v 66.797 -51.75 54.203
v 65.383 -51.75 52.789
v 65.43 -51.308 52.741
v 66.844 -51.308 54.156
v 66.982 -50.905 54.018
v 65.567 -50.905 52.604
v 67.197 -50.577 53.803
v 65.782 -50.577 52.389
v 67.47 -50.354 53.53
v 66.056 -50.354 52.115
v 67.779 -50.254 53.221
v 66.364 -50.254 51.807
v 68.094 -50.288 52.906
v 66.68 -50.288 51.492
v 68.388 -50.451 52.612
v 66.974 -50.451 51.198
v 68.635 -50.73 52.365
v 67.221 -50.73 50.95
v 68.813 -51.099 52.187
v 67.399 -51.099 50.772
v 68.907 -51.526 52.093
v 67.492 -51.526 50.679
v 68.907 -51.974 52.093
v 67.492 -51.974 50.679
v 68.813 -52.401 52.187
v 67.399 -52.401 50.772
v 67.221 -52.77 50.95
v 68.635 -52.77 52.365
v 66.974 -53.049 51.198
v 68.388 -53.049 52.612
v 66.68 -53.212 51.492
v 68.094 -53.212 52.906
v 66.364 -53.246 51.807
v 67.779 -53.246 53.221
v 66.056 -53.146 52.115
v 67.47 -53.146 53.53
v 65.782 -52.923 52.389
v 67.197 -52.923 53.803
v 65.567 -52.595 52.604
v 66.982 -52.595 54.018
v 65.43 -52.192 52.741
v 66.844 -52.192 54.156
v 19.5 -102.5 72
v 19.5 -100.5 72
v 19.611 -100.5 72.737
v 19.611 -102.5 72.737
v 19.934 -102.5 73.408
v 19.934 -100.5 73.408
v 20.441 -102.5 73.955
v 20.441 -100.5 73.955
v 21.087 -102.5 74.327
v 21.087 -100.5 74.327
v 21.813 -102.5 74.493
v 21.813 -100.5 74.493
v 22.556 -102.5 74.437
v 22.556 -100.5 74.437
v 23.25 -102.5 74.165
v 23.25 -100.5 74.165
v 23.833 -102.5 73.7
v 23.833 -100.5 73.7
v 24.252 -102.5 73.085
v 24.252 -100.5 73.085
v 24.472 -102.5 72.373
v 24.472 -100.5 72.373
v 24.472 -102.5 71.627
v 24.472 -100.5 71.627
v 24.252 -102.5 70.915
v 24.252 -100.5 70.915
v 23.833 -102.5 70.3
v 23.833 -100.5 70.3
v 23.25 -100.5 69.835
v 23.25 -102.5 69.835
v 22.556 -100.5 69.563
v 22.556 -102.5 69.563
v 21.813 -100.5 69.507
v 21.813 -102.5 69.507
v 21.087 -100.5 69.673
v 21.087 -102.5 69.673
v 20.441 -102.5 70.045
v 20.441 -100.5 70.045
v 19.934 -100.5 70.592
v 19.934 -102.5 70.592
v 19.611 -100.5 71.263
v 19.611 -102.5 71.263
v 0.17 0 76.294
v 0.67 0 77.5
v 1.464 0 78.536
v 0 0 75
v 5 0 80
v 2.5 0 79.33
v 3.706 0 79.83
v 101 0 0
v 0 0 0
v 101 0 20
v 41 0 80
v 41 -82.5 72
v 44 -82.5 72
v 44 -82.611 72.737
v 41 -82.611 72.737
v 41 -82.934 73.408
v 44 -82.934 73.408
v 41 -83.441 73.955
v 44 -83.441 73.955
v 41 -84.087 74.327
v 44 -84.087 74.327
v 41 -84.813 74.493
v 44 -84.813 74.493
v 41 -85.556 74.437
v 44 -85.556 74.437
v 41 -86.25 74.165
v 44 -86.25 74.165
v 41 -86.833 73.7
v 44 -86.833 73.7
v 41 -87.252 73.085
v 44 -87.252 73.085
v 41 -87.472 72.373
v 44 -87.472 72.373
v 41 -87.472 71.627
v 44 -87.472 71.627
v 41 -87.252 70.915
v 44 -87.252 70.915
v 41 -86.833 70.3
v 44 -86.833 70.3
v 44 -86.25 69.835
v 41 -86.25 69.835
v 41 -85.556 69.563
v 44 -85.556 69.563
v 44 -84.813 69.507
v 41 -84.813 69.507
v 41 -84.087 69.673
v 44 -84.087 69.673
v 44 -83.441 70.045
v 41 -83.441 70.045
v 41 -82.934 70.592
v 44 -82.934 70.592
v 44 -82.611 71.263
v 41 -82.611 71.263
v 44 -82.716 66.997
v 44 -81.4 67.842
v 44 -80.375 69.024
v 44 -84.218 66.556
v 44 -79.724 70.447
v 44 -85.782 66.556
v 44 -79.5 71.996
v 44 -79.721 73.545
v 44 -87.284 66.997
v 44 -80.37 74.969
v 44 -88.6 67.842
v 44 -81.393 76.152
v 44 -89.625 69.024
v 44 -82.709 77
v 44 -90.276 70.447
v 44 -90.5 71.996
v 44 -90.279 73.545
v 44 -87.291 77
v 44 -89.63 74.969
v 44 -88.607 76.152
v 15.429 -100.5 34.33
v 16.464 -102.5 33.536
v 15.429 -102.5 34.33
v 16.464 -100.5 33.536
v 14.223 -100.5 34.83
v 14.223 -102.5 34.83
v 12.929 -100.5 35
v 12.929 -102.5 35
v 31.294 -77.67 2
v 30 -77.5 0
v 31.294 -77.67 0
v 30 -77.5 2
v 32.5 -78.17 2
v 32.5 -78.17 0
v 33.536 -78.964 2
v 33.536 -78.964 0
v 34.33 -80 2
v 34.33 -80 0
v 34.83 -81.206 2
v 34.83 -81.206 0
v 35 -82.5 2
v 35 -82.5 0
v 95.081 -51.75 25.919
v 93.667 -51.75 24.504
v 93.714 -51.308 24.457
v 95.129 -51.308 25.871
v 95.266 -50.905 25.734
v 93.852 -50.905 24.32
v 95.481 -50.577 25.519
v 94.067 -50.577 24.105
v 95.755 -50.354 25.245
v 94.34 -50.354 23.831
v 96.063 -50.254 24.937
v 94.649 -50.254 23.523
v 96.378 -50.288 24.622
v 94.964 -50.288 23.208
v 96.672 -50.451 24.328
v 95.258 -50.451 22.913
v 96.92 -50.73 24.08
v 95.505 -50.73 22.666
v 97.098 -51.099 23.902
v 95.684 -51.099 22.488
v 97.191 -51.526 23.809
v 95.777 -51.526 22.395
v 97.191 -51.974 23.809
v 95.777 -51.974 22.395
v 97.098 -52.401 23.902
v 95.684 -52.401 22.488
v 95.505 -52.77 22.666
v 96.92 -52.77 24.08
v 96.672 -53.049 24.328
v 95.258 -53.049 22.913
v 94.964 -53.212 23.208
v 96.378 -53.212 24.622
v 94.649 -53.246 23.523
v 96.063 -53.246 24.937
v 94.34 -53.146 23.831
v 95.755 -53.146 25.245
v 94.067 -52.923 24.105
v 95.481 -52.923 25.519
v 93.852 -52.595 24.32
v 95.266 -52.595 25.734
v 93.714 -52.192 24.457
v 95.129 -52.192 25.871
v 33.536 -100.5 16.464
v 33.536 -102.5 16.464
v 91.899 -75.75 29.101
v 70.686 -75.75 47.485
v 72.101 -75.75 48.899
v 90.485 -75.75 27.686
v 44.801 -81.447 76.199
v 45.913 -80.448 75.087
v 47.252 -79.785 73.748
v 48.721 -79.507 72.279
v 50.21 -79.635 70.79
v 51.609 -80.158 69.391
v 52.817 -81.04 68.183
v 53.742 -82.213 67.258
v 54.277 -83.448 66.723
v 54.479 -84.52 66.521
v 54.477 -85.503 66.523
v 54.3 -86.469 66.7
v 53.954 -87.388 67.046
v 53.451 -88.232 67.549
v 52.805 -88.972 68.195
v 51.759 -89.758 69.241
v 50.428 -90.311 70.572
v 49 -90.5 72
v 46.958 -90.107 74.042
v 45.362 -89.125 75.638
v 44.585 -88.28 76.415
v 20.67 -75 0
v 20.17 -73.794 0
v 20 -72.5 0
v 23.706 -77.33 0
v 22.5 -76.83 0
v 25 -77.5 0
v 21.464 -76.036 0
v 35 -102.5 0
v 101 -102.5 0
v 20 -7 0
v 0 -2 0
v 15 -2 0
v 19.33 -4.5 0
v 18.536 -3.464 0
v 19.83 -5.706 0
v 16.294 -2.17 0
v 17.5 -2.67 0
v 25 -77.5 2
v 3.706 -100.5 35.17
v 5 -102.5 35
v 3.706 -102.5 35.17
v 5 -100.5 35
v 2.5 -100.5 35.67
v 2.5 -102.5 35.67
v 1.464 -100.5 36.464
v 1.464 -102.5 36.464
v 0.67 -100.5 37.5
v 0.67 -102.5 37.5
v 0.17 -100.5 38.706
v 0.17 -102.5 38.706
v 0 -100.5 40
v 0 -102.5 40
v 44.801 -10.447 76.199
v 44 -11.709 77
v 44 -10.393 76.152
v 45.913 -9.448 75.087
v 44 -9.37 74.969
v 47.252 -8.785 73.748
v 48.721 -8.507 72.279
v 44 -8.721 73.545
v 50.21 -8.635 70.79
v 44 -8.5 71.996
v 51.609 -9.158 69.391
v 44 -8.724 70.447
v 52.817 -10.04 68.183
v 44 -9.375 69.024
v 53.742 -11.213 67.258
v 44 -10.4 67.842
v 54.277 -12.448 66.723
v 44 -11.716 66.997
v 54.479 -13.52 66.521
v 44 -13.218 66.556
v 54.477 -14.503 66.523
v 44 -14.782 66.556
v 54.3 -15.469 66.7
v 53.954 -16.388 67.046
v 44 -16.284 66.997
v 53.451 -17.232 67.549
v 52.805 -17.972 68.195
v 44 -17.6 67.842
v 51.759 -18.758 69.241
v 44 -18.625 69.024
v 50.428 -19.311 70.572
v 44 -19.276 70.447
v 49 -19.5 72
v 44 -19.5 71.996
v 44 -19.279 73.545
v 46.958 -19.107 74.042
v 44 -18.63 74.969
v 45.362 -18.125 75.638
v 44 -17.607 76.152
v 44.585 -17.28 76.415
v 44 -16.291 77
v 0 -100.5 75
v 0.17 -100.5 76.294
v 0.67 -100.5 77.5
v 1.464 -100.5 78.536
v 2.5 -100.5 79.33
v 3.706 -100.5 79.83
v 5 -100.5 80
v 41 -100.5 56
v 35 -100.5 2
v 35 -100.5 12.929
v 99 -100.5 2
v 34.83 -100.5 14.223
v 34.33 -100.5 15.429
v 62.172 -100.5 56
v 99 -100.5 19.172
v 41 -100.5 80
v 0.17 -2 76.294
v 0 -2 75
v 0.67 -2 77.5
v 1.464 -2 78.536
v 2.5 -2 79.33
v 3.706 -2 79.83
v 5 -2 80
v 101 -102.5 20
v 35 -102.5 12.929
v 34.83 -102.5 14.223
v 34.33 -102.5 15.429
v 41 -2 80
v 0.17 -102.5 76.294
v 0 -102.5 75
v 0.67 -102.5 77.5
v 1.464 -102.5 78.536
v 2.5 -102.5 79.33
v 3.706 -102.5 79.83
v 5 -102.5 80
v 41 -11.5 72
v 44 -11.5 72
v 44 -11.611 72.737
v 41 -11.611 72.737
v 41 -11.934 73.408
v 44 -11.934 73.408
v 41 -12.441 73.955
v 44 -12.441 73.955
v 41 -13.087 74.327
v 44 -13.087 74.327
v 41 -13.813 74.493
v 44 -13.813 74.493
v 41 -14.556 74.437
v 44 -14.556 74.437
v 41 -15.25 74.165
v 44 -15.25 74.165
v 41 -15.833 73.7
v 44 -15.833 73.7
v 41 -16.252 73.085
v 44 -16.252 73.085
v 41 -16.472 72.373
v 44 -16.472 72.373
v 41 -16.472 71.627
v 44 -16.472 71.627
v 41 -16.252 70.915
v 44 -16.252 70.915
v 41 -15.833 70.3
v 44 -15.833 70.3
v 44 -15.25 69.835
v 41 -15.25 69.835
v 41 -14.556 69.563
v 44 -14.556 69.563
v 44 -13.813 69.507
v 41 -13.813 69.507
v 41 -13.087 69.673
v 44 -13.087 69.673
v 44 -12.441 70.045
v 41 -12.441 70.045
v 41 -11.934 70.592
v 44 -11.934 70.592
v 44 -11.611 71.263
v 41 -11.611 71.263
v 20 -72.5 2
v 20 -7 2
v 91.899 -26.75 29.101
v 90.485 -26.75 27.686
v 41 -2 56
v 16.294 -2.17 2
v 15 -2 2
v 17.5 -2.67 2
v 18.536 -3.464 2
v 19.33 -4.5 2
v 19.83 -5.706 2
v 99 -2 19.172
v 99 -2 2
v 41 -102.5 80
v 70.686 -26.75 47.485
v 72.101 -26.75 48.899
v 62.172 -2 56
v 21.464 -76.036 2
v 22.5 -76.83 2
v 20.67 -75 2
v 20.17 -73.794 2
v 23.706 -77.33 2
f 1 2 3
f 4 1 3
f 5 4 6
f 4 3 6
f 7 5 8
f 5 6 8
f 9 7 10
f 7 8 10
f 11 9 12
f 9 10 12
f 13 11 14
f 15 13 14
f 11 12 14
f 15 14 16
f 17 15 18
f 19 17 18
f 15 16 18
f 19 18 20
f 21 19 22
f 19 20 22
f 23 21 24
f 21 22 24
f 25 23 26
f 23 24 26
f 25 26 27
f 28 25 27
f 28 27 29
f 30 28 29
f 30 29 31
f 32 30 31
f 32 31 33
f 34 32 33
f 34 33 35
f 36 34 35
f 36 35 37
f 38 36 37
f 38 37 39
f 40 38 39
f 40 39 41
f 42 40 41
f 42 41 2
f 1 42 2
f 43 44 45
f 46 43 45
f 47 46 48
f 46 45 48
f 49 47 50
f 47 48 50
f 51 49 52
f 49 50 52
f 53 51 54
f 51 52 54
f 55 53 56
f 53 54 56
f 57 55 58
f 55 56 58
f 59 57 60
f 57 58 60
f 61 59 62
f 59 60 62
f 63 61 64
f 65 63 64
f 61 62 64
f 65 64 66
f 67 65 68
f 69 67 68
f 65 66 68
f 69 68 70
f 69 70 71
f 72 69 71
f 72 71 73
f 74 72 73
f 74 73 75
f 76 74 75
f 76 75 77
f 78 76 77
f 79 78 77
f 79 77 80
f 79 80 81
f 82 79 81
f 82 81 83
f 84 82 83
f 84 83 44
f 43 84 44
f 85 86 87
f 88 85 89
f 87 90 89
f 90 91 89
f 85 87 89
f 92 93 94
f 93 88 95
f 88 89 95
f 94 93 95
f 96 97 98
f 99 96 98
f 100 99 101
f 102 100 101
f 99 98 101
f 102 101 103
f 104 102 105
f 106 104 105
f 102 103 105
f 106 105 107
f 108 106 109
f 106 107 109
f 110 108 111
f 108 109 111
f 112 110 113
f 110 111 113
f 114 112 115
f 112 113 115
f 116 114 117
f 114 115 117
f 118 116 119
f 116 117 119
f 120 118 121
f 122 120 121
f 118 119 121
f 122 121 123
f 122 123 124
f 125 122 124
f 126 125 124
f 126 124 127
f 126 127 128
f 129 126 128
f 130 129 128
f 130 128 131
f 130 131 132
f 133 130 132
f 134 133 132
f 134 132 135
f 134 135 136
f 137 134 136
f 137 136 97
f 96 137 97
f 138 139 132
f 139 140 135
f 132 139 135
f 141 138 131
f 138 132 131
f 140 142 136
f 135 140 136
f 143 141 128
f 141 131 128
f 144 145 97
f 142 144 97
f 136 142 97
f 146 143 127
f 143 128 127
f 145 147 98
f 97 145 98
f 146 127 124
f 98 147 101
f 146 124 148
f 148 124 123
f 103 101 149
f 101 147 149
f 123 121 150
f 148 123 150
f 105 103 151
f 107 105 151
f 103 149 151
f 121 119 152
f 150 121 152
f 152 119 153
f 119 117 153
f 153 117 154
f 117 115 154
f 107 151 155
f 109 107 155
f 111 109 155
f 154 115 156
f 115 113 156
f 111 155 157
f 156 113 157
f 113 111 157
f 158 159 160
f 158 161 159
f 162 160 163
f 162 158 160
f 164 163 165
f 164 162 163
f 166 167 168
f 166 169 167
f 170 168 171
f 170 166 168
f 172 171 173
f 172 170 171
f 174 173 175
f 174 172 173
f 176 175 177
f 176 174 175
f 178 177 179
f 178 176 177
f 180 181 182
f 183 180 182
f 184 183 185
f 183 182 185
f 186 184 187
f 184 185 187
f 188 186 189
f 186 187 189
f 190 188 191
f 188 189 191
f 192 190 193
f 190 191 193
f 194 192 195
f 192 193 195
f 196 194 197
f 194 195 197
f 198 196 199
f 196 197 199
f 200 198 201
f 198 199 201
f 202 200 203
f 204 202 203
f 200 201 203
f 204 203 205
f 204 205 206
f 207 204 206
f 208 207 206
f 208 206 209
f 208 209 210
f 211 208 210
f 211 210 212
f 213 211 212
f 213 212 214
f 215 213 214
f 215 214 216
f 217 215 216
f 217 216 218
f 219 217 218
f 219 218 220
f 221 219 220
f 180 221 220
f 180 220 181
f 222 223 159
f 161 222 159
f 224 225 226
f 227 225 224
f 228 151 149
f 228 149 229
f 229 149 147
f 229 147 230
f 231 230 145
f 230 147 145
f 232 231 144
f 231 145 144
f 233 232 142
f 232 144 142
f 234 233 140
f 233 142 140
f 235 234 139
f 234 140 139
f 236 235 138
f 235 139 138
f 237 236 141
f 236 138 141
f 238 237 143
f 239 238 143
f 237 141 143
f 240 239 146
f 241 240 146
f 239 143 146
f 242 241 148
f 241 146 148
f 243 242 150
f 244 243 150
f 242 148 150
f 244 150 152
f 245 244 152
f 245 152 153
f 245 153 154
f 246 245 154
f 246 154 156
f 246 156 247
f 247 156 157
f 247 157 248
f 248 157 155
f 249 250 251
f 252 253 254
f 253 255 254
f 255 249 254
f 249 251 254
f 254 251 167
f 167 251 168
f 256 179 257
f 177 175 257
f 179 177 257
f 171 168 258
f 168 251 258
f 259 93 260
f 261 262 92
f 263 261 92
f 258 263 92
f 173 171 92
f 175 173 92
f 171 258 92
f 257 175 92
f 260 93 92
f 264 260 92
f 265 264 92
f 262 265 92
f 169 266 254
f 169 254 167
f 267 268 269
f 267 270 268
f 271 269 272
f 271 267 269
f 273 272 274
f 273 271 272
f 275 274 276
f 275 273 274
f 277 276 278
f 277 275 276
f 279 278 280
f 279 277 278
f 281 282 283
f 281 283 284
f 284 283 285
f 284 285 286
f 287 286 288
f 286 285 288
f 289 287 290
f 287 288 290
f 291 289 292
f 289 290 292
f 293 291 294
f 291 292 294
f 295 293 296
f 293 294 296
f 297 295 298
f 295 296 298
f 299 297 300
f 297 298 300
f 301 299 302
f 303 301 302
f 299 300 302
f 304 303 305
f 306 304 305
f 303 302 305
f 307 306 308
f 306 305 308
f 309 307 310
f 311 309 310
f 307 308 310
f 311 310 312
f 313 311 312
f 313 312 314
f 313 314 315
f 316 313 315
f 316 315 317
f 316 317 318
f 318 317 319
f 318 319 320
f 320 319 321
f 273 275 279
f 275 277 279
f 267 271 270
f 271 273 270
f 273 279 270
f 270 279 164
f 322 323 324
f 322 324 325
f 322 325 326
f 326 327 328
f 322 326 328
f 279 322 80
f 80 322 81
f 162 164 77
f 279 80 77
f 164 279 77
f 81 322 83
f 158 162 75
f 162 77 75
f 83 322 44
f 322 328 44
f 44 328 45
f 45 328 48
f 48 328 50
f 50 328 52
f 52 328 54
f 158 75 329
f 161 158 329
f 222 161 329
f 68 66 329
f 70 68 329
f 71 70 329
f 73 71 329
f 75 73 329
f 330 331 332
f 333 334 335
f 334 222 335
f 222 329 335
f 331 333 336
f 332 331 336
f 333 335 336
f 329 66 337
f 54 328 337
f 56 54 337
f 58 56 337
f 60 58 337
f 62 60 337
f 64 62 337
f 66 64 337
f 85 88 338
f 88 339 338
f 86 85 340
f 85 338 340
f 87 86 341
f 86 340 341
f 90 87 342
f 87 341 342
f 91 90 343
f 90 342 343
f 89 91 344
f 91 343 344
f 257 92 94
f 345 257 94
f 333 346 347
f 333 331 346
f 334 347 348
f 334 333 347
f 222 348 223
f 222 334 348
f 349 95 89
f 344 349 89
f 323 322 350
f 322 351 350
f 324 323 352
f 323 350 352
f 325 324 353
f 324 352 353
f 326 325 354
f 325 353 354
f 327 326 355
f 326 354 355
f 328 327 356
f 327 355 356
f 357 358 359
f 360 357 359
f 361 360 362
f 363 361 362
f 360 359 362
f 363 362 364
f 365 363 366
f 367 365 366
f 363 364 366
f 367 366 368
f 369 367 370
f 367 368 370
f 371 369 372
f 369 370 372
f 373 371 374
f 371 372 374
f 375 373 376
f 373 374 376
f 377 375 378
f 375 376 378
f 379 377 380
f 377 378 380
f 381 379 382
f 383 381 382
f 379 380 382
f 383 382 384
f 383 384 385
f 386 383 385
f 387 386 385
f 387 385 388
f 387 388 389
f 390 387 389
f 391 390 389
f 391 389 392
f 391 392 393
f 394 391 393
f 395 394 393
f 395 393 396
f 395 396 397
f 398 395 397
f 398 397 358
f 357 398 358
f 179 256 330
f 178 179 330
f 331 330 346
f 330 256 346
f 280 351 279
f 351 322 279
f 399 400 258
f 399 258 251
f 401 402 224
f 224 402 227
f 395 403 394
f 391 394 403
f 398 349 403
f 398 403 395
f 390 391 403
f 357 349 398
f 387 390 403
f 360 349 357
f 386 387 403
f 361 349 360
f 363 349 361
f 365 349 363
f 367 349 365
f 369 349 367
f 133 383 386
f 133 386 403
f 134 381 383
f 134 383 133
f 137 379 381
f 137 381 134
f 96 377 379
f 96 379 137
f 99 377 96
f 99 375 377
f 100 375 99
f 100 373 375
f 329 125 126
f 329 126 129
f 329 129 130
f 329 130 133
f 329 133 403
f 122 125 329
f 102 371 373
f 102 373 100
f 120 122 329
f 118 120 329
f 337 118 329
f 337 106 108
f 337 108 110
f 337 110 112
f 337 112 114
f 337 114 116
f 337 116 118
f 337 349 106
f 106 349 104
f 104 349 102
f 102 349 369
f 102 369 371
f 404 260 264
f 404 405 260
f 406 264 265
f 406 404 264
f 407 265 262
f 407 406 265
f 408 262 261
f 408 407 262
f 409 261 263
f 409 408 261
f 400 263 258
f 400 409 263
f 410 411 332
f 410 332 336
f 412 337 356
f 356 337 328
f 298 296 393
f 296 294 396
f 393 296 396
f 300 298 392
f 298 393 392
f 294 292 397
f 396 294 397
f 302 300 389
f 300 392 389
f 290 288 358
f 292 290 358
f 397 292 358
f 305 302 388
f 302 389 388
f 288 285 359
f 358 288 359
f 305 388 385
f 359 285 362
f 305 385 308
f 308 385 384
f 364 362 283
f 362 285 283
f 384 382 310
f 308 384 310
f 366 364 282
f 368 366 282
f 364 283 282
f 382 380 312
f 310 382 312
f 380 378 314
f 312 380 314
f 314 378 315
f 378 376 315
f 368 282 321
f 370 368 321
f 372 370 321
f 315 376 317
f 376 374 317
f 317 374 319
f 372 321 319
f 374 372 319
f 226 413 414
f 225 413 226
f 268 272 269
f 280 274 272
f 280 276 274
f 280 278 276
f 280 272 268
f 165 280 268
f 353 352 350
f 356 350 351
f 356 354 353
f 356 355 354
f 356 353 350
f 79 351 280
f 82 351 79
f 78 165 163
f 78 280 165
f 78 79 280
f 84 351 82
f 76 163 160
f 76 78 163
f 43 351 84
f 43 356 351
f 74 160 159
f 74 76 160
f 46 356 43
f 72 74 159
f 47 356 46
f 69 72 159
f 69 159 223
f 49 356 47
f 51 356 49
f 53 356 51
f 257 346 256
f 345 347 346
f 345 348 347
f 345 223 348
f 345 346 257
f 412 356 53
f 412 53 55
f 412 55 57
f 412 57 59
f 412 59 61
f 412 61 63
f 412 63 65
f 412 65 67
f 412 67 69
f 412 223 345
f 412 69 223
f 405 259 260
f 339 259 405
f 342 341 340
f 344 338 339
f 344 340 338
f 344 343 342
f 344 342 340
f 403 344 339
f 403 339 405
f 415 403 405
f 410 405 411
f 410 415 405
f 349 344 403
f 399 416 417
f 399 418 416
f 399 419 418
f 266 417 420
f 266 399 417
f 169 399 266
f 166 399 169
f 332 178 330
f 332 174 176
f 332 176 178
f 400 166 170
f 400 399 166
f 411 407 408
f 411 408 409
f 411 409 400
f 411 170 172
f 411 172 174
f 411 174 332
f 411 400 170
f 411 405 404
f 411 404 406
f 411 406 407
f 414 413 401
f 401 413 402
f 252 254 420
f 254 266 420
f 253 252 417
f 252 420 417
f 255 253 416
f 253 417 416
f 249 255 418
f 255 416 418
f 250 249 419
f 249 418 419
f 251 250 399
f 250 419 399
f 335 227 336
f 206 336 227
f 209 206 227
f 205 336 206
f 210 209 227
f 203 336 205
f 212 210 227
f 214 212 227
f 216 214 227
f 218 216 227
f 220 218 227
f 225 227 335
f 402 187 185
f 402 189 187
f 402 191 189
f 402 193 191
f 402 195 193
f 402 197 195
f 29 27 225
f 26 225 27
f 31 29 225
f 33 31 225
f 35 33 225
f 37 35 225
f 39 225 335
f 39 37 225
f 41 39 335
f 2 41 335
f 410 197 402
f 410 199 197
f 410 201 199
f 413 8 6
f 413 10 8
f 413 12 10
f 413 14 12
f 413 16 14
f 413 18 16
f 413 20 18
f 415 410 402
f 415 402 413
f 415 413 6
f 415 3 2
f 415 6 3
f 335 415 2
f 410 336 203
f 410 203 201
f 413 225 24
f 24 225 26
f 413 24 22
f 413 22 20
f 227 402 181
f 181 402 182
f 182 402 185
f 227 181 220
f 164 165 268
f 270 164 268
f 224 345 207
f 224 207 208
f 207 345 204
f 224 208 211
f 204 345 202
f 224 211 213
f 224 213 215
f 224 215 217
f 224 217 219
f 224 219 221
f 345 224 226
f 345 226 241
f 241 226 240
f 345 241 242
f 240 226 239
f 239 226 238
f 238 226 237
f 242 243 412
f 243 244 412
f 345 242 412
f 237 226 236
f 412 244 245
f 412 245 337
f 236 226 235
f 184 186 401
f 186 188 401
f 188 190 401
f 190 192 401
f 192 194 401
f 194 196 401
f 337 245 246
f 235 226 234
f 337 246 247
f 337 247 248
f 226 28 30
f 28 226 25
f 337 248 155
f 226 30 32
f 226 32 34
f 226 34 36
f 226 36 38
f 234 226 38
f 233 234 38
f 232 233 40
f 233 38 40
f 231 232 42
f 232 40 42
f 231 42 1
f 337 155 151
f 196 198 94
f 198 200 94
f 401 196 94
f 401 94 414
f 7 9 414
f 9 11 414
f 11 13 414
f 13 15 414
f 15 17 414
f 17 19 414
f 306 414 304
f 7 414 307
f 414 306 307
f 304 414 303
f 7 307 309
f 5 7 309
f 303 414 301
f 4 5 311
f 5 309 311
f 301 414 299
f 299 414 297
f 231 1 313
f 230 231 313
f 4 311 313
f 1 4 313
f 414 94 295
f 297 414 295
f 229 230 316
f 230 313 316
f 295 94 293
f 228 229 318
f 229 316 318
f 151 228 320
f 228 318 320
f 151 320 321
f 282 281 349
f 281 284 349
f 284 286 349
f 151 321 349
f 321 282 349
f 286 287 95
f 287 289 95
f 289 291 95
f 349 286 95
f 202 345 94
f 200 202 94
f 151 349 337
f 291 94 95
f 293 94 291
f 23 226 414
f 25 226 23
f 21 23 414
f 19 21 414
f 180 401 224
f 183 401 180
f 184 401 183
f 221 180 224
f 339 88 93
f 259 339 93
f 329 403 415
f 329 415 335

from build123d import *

# Parameters (mm, degrees)
F1_DEPTH  = 102.5
F2_T      = -2
F3_W      = 41
F3_H      = 98.5
F4_DEPTH  = 78.001
F5_W      = 98.5
F5_H      = 21.1715728753
F8_D      = 5
F9_W      = 28
F9_H      = 49
F10_DEPTH = 44.4274068712
F12_D     = 5
F12_DEPTH = 2.001
F14_D     = 3
F14_DEPTH = 12
F14_TIP   = 0.9012909285
F15_W     = 98.5
F15_H     = 2
F16_DEPTH = 20
F18_DEPTH = 25
F20_R     = 5.5
F21_DEPTH = 25
F22_R     = 5


with BuildPart() as f1:
    # F0 (on Front) → F1 (new body)
    with BuildSketch(Plane.XZ):
        Polygon((0, 80), (0, 0), (101, 0), (101, 20), (41, 80), align=None)
    extrude(amount=F1_DEPTH)

    # F2
    f2_openings = [f1.faces().sort_by_distance(p)[0] for p in [
        (0, -51.25, 40),
        (20.5, -51.25, 80),
    ]]
    offset(amount=F2_T, openings=f2_openings)

    # F3 (on face) → F4 (cut, through all)
    with BuildSketch(Plane.XY.offset(2)):
        with Locations((20.5, -51.25)):
            Rectangle(F3_W, F3_H)
    extrude(amount=F4_DEPTH, mode=Mode.SUBTRACT)

    # F5 (on face) → F6 (join, up to the last surface of F1)
    with BuildSketch(Plane(origin=(41, 0, 0), x_dir=(0, -1, 0), z_dir=(-1, 0, 0))):
        with Locations((51.25, 66.5857864376)):
            Rectangle(F5_W, F5_H)
    extrude(until=Until.LAST, dir=(1, 0, 0))

    # F8 (through all)
    with Locations(Plane(origin=(41, 0, 0), x_dir=(0, -1, 0), z_dir=(-1, 0, 0))):
        with Locations((85, 72), (14, 72)):
            Hole(F8_D / 2)

    # F9 (on face) → F10 (cut, through all)
    with BuildSketch(Plane(origin=(59.0857864376, 0, 59.0857864376), x_dir=(0.7071067812, 0, -0.7071067812), z_dir=(-0.7071067812, 0, -0.7071067812))):
        with Locations((30.405591591, 51.25)):
            Rectangle(F9_W, F9_H)
    extrude(amount=-F10_DEPTH, mode=Mode.SUBTRACT)

    # F12 (through all, one way)
    with BuildSketch(Plane(origin=(0, -100.5, 0), x_dir=(-1, 0, 0), z_dir=(0, 1, 0))):
        with Locations((-22, 72)):
            Circle(F12_D / 2)
    extrude(amount=-F12_DEPTH, mode=Mode.SUBTRACT)

    # F14
    with Locations(Plane(origin=(60.5, 0, 60.5), x_dir=(0.7071067812, 0, -0.7071067812), z_dir=(0.7071067812, 0, 0.7071067812))):
        with Locations((10.405591591, -51.75), (50.405591591, -51.75)):
            Hole(F14_D / 2, depth=F14_DEPTH)
            with Locations((0, 0, -(F14_DEPTH + F14_TIP / 2))):  # 118° drill point
                Cone(0, F14_D / 2, F14_TIP, mode=Mode.SUBTRACT)

    # F15 (on face) → F16 (cut)
    with BuildSketch(Plane(origin=(0, 0, 0), x_dir=(0, -1, 0), z_dir=(-1, 0, 0))):
        with Locations((51.25, 1)):
            Rectangle(F15_W, F15_H)
    extrude(amount=-F16_DEPTH, mode=Mode.SUBTRACT)

    # F17 (on face) → F18 (cut)
    with BuildSketch(Plane.XZ.offset(102.5)):
        Polygon((0, 35), (0, 0), (35, 0), (35, 15), (15, 35), align=None)
    extrude(amount=-F18_DEPTH, mode=Mode.SUBTRACT)

    # F20 (on offset) → F21 (cut)
    with BuildSketch(Plane(origin=(44, 0, 0), x_dir=(0, -1, 0), z_dir=(-1, 0, 0))):
        with Locations((85, 72)):
            Circle(F20_R)
        with Locations((14, 72)):
            Circle(F20_R)
    extrude(amount=-F21_DEPTH, mode=Mode.SUBTRACT)

    # F22
    f22_edges = [f1.edges().sort_by_distance(p)[0] for p in [
        (35, -77.5, 1),
        (35, -101.5, 15),
        (15, -101.5, 35),
        (20, -77.5, 1),
        (20, -2, 1),
        (0, -1, 80),
        (0, -101.5, 80),
        (0, -101.5, 35),
    ]]
    fillet(f22_edges, radius=F22_R)


solid = f1.part
